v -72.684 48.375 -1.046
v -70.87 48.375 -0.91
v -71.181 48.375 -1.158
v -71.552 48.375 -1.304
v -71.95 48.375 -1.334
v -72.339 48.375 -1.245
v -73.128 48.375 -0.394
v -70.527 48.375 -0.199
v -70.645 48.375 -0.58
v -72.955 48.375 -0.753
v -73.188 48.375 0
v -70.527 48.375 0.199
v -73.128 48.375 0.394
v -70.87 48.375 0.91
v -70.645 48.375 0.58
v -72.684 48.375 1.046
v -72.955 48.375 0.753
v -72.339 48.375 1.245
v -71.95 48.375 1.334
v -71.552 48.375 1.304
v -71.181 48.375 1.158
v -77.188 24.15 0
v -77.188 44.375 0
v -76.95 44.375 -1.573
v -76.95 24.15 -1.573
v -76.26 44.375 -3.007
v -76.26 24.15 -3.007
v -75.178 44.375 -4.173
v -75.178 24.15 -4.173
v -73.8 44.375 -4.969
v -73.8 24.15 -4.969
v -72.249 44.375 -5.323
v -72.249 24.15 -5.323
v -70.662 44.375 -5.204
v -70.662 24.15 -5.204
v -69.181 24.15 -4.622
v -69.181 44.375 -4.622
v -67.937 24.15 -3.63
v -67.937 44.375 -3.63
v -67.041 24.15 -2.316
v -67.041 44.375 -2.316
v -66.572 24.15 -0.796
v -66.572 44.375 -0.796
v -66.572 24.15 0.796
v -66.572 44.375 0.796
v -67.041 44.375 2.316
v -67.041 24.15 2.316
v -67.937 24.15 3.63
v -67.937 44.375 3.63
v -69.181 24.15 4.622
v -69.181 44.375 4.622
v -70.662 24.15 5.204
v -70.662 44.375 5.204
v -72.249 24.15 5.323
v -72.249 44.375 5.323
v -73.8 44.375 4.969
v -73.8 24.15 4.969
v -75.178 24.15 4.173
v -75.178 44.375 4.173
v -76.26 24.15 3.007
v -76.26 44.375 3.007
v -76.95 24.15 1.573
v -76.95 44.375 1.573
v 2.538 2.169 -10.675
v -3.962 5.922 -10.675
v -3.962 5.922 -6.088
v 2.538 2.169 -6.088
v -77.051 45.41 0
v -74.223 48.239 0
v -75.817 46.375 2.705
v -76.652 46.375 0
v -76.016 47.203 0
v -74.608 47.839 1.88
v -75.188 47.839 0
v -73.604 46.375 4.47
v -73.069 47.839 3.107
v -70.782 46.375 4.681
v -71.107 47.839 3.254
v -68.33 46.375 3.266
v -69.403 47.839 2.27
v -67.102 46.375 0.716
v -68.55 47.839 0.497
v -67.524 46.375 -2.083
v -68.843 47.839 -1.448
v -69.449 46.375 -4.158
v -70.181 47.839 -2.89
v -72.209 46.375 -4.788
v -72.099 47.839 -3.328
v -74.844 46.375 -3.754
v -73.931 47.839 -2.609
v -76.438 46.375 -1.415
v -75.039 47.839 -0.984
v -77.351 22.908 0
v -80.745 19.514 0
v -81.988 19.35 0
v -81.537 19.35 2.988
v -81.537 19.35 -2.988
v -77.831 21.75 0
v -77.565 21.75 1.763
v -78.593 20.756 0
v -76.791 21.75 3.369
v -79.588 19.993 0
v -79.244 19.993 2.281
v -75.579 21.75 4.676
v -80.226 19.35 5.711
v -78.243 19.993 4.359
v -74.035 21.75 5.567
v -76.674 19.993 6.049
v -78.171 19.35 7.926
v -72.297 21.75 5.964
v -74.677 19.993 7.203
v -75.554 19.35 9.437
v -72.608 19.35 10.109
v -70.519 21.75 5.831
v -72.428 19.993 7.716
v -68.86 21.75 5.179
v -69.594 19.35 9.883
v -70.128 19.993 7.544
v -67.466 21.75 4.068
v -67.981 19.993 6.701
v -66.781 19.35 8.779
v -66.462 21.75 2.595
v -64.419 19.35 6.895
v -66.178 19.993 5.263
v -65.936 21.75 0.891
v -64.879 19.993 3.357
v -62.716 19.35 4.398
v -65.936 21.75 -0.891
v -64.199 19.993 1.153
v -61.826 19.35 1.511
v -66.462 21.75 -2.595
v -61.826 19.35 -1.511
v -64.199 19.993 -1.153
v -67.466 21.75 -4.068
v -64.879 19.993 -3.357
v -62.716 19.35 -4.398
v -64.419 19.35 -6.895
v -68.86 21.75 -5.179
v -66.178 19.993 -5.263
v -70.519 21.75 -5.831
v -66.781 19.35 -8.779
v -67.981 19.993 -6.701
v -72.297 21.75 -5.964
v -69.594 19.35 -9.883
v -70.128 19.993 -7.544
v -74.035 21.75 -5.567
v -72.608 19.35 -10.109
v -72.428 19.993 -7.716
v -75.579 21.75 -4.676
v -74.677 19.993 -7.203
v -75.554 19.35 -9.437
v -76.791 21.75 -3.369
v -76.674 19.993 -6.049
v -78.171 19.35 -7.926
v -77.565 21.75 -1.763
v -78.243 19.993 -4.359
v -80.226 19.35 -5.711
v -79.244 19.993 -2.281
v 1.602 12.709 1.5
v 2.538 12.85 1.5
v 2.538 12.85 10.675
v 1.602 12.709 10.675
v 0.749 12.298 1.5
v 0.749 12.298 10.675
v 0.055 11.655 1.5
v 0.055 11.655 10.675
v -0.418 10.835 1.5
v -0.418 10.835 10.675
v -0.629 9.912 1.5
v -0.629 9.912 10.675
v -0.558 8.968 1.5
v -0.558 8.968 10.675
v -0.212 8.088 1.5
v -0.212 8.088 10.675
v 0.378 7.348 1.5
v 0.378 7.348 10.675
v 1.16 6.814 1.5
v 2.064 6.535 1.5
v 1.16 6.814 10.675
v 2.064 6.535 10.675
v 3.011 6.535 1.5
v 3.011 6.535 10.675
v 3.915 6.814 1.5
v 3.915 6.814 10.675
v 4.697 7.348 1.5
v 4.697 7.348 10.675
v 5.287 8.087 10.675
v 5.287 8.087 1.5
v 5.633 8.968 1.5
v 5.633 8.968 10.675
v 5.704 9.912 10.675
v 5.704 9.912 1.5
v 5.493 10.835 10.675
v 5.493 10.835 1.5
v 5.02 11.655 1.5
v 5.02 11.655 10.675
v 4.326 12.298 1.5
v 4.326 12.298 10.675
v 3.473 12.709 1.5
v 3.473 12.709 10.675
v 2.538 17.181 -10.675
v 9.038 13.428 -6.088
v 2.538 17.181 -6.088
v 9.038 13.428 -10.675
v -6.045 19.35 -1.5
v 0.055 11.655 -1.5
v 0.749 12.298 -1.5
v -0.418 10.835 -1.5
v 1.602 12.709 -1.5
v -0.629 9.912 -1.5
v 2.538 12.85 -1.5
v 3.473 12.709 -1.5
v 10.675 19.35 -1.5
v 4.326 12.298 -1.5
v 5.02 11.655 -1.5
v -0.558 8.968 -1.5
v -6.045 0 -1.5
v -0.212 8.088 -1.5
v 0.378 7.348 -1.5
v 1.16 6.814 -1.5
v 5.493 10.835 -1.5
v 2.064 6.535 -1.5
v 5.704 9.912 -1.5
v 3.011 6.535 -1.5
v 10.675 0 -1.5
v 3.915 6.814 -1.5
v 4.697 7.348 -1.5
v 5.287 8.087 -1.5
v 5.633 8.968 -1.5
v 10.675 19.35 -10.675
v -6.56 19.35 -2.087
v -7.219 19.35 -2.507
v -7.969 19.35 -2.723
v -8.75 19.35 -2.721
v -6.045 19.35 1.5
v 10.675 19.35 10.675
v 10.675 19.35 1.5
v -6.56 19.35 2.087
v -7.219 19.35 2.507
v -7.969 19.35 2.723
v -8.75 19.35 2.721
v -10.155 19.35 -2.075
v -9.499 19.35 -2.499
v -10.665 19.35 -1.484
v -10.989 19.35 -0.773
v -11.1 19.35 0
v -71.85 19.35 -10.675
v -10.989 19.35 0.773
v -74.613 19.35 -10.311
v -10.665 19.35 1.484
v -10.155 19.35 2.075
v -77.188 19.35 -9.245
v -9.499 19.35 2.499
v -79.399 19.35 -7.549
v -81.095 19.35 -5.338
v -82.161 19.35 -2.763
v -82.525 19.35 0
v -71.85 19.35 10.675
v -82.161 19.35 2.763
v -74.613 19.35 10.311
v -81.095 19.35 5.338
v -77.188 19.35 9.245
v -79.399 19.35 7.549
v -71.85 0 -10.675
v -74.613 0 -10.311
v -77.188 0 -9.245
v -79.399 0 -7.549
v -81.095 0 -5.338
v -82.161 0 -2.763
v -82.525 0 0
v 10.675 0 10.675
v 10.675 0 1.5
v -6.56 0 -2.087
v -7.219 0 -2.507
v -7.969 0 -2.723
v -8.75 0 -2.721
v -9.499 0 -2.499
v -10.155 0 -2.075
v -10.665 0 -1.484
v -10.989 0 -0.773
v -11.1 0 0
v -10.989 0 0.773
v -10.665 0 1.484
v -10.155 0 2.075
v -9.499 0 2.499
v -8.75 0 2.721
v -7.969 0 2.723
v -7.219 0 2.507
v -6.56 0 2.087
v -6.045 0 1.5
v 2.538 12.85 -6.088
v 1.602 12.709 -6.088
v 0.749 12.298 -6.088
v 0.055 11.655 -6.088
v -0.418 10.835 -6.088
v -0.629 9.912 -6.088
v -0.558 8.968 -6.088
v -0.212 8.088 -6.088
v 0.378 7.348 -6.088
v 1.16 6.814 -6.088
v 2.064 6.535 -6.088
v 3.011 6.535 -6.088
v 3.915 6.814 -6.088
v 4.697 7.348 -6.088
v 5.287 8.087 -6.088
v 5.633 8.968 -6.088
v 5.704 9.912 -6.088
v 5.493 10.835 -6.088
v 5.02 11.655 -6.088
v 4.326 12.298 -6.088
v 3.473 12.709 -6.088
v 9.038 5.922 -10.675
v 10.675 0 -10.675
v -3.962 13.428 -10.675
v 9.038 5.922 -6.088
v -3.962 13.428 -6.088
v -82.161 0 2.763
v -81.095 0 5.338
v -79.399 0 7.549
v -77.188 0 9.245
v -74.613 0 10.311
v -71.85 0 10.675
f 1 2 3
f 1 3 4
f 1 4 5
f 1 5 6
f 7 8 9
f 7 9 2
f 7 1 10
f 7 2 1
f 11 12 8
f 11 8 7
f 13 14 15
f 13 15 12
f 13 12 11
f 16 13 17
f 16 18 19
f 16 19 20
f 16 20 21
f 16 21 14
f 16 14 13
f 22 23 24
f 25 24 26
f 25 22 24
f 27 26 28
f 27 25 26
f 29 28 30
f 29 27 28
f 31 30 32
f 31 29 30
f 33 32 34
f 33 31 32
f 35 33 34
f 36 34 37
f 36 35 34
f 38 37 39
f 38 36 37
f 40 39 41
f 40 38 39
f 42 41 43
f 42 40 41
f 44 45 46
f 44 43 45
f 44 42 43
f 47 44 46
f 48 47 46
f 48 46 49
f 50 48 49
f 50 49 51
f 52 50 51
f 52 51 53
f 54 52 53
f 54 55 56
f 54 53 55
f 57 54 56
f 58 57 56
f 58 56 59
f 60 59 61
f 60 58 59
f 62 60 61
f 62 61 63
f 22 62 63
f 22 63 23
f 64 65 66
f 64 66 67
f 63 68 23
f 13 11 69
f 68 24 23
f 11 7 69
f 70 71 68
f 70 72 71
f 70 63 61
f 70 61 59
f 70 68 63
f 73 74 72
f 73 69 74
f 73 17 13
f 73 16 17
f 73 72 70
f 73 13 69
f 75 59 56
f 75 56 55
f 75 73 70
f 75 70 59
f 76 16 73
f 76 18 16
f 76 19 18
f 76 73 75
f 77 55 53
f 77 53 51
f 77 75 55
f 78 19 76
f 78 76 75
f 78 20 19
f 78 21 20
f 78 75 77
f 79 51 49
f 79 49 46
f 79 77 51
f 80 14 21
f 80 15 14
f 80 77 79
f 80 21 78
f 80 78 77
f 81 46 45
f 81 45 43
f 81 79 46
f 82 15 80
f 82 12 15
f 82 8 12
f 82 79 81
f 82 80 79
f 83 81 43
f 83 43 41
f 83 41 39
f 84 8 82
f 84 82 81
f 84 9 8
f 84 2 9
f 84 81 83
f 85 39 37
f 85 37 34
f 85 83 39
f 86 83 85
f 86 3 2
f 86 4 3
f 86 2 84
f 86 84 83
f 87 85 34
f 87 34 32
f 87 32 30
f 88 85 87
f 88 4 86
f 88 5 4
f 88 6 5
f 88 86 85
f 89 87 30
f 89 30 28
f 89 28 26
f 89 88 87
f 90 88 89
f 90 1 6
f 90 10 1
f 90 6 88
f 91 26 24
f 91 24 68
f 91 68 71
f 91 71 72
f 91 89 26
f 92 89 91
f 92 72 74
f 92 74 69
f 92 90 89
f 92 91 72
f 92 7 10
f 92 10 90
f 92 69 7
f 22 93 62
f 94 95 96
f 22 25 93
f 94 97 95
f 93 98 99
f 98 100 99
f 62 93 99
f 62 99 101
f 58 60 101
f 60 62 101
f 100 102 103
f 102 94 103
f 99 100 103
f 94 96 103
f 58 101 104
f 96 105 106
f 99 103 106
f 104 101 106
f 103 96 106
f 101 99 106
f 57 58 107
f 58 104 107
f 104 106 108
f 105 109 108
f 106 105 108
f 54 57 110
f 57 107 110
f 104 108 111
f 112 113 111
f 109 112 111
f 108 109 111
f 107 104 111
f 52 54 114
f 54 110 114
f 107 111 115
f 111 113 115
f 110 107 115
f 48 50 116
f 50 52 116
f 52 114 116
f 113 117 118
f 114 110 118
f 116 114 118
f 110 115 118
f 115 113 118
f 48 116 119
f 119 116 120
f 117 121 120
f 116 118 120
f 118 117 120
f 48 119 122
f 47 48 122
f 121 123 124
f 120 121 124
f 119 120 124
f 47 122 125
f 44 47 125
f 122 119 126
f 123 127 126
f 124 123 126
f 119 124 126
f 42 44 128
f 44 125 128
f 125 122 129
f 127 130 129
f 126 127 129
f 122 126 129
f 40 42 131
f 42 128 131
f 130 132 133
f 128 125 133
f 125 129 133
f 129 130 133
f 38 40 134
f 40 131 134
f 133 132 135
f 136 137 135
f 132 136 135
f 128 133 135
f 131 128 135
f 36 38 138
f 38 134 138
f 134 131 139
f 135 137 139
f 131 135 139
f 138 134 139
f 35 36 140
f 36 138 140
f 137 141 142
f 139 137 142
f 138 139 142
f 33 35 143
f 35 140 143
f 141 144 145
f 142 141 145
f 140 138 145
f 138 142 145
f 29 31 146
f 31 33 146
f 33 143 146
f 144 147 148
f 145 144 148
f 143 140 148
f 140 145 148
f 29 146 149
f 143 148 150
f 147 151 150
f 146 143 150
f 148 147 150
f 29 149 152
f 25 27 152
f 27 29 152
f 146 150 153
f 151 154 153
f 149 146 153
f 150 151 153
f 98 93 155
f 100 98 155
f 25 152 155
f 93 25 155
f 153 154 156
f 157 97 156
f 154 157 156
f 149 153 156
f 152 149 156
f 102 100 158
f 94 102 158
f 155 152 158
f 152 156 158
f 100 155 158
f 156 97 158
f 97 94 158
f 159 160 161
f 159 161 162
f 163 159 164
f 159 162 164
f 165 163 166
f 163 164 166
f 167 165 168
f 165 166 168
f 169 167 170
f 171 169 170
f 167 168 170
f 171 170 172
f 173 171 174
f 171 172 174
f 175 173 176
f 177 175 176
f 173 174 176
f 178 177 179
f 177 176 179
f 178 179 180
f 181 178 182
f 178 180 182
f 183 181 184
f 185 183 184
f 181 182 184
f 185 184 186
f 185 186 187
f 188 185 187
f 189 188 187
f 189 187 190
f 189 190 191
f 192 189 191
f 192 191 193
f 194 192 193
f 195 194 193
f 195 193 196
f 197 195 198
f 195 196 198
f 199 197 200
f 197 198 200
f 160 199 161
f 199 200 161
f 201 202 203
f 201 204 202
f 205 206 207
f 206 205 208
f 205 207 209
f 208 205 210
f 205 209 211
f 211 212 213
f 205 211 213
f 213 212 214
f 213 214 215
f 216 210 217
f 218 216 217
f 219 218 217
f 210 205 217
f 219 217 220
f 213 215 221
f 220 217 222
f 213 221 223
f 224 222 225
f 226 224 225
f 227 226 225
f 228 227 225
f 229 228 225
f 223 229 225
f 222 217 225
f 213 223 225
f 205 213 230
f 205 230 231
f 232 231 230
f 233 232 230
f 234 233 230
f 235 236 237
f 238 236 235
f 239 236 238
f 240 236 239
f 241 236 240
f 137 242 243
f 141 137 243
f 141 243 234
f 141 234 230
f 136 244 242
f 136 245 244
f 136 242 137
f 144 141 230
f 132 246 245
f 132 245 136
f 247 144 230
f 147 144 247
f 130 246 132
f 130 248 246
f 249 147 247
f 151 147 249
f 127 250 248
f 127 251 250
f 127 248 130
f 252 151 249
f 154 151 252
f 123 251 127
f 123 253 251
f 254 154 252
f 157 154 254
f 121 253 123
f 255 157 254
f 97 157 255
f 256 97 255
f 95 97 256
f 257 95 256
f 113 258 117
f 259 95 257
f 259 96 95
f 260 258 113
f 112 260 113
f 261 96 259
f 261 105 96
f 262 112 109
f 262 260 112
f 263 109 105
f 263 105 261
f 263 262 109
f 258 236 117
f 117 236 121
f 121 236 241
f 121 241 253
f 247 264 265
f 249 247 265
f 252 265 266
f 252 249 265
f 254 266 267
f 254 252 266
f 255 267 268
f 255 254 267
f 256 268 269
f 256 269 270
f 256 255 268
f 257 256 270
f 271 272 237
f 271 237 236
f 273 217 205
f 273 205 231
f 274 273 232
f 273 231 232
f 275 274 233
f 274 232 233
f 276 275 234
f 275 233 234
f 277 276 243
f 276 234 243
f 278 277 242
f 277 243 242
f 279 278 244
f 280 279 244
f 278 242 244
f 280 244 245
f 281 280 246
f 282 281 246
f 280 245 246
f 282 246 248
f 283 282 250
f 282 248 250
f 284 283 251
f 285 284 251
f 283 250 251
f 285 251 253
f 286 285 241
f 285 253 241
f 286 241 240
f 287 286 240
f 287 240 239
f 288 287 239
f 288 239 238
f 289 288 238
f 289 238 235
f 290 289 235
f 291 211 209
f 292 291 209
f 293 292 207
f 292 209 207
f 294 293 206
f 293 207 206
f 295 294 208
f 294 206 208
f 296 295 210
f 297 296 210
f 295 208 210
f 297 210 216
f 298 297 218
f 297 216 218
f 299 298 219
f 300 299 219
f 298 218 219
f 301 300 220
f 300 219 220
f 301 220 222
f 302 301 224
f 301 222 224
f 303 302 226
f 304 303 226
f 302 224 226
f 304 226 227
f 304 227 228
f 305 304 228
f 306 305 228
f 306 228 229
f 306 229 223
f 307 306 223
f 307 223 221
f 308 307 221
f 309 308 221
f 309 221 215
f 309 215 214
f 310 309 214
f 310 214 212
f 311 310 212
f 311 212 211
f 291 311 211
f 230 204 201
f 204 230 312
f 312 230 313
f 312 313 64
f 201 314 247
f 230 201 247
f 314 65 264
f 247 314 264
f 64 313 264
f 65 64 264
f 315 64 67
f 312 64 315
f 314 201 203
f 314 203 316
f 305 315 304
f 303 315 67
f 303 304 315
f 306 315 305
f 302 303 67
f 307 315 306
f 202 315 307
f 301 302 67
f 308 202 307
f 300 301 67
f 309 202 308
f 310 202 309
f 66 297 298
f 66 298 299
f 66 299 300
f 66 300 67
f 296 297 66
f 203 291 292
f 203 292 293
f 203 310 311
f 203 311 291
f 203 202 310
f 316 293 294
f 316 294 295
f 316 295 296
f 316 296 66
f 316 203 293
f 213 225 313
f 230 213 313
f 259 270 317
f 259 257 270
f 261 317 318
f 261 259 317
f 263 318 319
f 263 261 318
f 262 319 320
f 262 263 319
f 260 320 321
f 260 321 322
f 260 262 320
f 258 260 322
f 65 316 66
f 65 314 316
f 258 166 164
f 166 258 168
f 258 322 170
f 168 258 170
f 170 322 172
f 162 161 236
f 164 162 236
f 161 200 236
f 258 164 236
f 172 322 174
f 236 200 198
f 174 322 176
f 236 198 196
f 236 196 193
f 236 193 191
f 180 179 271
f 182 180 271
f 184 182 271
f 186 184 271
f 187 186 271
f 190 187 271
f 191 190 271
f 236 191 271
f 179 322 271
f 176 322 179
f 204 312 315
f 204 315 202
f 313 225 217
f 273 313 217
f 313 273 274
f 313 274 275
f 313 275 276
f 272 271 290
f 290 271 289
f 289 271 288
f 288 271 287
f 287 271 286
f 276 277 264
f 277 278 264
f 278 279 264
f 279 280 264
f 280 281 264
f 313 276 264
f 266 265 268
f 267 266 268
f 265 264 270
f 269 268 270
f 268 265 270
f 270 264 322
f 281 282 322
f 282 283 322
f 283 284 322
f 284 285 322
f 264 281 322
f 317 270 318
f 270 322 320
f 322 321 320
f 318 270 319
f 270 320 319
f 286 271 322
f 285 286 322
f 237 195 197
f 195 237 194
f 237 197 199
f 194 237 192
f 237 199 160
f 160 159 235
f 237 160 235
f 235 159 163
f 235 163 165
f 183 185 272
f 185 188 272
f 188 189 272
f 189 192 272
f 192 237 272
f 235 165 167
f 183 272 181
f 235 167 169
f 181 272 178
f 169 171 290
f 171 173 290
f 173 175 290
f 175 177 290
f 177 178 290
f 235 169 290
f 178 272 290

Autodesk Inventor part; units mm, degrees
ref_plane "YZ Plane" through (0, 0, 0) normal (1, 0, 0) x (0, 1, 0)
ref_plane "XZ Plane" through (0, 0, 0) normal (0, 1, 0) x (-1, 0, 0)
ref_plane "XY Plane" through (0, 0, 0) normal (0, 0, 1) x (1, 0, 0)
sketch "Bottom" plane through (0, 0, 0) normal (0, 1, 0) x (-1, 0, 0)
  line L0 (-10.675, -10.675) -> (82.525, -10.675)
  line L1 (82.525, -10.675) -> (82.525, 10.675)
  line L2 (82.525, 10.675) -> (-10.675, 10.675)
  line L3 (-10.675, 10.675) -> (-10.675, -10.675) construction
  line L4 (-10.675, 1.5) -> (8.35, 1.5)
  line L5 (8.35, 1.5) -> (8.35, -1.5)
  line L6 (8.35, -1.5) -> (-10.675, -1.5)
  line L7 (-10.675, 1.5) -> (-10.675, 10.675)
  line L8 (-10.675, -1.5) -> (-10.675, -10.675)
  circle A0 centre (71.85, 0) radius 5.3375
  point P0 (0, 0)
  point P1 (8.35, 0)
  dimension "Width" = 21.35
  dimension "d2" = 10.675
  dimension "d3" = 93.2
  dimension "d4" = 10.675
  dimension "d8" = 9.175
  dimension "d9" = 9.175
  dimension "d10" = 3
  dimension "ArmMount" = 19.025
  dimension "d15" = 19.025
  dimension "d16" = 10.675
  dimension "d19" = 10.675
  dimension "d22" = 10.675
  dimension "d23" = 10.675
extrude "Extrusion1" add sketch "Bottom" along normal blind 19.35 contours L8 L6 L5 L4 L7 L2 L1 L0 | A0
extrude "Extrusion2" add sketch "Bottom" along normal blind 48.375 contours A0
hole "Hole1" at (-8.35, 0, 0) direction (0, 1, 0) diameter 5.5 end through all
sketch "Side" plane through (10.675, 0, -10.675) normal (0, 0, -1) x (-1, 0, 0)
  line L0 (0, 19.35) -> (93.2, 19.35) projected
  line L1 (0, 0) -> (0, 19.35) projected
  line L2 (8.1375, 2.1694) -> (1.6375, 5.9222)
  line L3 (1.6375, 5.9222) -> (1.6375, 13.4278)
  line L4 (1.6375, 13.4278) -> (8.1375, 17.1806)
  line L5 (8.1375, 17.1806) -> (14.6375, 13.4278)
  line L6 (14.6375, 13.4278) -> (14.6375, 5.9222)
  line L7 (14.6375, 5.9222) -> (8.1375, 2.1694)
  point P0 (10.675, 0)
  point P1 (8.1375, 9.675)
  point P2 (8.1375, 9.675)
  dimension "d31" = 9.675
  dimension "d32" = 8.1375
  dimension "Nut" = 6.5
  dimension "d44" = 2.1694
hole "Hole2" at (2.5375, 9.675, -10.675) direction (0, 0, 1) diameter 6.35 end through all
extrude "Extrusion3" cut sketch "Side" against normal blind 4.5875
fillet "Fillet1" radius 10.675 2 edges at (-82.525, 9.675, -10.675) (-82.525, 9.675, 10.675)
fillet "Fillet2" radius 4 1 edges at (-66.5125, 48.375, 0)
fillet "Fillet3" radius 4.8 1 edges at (-66.5125, 19.35, 0)
equation "\"d2\" = 0.5 * Width"
equation "\"d4\" = d2"
equation "\"d9\" = d8"
equation "\"d15\" = ArmMount"
equation "\"d16\" = d2"
equation "\"d19\" = d2"
equation "\"d22\" = d2"
equation "\"d23\" = d2"
equation "\"d20\" = 2.5 * Thickness"
equation "\"d31\" = 0.5 * Thickness"
equation "\"d32\" = -0.25 * GearDiameter + 0.5 * ArmMount"
equation "\"d45\" = 0.5 * d9"
equation "\"d47\" = 0.5 * Width"
equation "\"Thickness\" = 19.35"
equation "\"GearDiameter\" = 5.5"
properties part number "Egg_Turner_Motor_Arm"
